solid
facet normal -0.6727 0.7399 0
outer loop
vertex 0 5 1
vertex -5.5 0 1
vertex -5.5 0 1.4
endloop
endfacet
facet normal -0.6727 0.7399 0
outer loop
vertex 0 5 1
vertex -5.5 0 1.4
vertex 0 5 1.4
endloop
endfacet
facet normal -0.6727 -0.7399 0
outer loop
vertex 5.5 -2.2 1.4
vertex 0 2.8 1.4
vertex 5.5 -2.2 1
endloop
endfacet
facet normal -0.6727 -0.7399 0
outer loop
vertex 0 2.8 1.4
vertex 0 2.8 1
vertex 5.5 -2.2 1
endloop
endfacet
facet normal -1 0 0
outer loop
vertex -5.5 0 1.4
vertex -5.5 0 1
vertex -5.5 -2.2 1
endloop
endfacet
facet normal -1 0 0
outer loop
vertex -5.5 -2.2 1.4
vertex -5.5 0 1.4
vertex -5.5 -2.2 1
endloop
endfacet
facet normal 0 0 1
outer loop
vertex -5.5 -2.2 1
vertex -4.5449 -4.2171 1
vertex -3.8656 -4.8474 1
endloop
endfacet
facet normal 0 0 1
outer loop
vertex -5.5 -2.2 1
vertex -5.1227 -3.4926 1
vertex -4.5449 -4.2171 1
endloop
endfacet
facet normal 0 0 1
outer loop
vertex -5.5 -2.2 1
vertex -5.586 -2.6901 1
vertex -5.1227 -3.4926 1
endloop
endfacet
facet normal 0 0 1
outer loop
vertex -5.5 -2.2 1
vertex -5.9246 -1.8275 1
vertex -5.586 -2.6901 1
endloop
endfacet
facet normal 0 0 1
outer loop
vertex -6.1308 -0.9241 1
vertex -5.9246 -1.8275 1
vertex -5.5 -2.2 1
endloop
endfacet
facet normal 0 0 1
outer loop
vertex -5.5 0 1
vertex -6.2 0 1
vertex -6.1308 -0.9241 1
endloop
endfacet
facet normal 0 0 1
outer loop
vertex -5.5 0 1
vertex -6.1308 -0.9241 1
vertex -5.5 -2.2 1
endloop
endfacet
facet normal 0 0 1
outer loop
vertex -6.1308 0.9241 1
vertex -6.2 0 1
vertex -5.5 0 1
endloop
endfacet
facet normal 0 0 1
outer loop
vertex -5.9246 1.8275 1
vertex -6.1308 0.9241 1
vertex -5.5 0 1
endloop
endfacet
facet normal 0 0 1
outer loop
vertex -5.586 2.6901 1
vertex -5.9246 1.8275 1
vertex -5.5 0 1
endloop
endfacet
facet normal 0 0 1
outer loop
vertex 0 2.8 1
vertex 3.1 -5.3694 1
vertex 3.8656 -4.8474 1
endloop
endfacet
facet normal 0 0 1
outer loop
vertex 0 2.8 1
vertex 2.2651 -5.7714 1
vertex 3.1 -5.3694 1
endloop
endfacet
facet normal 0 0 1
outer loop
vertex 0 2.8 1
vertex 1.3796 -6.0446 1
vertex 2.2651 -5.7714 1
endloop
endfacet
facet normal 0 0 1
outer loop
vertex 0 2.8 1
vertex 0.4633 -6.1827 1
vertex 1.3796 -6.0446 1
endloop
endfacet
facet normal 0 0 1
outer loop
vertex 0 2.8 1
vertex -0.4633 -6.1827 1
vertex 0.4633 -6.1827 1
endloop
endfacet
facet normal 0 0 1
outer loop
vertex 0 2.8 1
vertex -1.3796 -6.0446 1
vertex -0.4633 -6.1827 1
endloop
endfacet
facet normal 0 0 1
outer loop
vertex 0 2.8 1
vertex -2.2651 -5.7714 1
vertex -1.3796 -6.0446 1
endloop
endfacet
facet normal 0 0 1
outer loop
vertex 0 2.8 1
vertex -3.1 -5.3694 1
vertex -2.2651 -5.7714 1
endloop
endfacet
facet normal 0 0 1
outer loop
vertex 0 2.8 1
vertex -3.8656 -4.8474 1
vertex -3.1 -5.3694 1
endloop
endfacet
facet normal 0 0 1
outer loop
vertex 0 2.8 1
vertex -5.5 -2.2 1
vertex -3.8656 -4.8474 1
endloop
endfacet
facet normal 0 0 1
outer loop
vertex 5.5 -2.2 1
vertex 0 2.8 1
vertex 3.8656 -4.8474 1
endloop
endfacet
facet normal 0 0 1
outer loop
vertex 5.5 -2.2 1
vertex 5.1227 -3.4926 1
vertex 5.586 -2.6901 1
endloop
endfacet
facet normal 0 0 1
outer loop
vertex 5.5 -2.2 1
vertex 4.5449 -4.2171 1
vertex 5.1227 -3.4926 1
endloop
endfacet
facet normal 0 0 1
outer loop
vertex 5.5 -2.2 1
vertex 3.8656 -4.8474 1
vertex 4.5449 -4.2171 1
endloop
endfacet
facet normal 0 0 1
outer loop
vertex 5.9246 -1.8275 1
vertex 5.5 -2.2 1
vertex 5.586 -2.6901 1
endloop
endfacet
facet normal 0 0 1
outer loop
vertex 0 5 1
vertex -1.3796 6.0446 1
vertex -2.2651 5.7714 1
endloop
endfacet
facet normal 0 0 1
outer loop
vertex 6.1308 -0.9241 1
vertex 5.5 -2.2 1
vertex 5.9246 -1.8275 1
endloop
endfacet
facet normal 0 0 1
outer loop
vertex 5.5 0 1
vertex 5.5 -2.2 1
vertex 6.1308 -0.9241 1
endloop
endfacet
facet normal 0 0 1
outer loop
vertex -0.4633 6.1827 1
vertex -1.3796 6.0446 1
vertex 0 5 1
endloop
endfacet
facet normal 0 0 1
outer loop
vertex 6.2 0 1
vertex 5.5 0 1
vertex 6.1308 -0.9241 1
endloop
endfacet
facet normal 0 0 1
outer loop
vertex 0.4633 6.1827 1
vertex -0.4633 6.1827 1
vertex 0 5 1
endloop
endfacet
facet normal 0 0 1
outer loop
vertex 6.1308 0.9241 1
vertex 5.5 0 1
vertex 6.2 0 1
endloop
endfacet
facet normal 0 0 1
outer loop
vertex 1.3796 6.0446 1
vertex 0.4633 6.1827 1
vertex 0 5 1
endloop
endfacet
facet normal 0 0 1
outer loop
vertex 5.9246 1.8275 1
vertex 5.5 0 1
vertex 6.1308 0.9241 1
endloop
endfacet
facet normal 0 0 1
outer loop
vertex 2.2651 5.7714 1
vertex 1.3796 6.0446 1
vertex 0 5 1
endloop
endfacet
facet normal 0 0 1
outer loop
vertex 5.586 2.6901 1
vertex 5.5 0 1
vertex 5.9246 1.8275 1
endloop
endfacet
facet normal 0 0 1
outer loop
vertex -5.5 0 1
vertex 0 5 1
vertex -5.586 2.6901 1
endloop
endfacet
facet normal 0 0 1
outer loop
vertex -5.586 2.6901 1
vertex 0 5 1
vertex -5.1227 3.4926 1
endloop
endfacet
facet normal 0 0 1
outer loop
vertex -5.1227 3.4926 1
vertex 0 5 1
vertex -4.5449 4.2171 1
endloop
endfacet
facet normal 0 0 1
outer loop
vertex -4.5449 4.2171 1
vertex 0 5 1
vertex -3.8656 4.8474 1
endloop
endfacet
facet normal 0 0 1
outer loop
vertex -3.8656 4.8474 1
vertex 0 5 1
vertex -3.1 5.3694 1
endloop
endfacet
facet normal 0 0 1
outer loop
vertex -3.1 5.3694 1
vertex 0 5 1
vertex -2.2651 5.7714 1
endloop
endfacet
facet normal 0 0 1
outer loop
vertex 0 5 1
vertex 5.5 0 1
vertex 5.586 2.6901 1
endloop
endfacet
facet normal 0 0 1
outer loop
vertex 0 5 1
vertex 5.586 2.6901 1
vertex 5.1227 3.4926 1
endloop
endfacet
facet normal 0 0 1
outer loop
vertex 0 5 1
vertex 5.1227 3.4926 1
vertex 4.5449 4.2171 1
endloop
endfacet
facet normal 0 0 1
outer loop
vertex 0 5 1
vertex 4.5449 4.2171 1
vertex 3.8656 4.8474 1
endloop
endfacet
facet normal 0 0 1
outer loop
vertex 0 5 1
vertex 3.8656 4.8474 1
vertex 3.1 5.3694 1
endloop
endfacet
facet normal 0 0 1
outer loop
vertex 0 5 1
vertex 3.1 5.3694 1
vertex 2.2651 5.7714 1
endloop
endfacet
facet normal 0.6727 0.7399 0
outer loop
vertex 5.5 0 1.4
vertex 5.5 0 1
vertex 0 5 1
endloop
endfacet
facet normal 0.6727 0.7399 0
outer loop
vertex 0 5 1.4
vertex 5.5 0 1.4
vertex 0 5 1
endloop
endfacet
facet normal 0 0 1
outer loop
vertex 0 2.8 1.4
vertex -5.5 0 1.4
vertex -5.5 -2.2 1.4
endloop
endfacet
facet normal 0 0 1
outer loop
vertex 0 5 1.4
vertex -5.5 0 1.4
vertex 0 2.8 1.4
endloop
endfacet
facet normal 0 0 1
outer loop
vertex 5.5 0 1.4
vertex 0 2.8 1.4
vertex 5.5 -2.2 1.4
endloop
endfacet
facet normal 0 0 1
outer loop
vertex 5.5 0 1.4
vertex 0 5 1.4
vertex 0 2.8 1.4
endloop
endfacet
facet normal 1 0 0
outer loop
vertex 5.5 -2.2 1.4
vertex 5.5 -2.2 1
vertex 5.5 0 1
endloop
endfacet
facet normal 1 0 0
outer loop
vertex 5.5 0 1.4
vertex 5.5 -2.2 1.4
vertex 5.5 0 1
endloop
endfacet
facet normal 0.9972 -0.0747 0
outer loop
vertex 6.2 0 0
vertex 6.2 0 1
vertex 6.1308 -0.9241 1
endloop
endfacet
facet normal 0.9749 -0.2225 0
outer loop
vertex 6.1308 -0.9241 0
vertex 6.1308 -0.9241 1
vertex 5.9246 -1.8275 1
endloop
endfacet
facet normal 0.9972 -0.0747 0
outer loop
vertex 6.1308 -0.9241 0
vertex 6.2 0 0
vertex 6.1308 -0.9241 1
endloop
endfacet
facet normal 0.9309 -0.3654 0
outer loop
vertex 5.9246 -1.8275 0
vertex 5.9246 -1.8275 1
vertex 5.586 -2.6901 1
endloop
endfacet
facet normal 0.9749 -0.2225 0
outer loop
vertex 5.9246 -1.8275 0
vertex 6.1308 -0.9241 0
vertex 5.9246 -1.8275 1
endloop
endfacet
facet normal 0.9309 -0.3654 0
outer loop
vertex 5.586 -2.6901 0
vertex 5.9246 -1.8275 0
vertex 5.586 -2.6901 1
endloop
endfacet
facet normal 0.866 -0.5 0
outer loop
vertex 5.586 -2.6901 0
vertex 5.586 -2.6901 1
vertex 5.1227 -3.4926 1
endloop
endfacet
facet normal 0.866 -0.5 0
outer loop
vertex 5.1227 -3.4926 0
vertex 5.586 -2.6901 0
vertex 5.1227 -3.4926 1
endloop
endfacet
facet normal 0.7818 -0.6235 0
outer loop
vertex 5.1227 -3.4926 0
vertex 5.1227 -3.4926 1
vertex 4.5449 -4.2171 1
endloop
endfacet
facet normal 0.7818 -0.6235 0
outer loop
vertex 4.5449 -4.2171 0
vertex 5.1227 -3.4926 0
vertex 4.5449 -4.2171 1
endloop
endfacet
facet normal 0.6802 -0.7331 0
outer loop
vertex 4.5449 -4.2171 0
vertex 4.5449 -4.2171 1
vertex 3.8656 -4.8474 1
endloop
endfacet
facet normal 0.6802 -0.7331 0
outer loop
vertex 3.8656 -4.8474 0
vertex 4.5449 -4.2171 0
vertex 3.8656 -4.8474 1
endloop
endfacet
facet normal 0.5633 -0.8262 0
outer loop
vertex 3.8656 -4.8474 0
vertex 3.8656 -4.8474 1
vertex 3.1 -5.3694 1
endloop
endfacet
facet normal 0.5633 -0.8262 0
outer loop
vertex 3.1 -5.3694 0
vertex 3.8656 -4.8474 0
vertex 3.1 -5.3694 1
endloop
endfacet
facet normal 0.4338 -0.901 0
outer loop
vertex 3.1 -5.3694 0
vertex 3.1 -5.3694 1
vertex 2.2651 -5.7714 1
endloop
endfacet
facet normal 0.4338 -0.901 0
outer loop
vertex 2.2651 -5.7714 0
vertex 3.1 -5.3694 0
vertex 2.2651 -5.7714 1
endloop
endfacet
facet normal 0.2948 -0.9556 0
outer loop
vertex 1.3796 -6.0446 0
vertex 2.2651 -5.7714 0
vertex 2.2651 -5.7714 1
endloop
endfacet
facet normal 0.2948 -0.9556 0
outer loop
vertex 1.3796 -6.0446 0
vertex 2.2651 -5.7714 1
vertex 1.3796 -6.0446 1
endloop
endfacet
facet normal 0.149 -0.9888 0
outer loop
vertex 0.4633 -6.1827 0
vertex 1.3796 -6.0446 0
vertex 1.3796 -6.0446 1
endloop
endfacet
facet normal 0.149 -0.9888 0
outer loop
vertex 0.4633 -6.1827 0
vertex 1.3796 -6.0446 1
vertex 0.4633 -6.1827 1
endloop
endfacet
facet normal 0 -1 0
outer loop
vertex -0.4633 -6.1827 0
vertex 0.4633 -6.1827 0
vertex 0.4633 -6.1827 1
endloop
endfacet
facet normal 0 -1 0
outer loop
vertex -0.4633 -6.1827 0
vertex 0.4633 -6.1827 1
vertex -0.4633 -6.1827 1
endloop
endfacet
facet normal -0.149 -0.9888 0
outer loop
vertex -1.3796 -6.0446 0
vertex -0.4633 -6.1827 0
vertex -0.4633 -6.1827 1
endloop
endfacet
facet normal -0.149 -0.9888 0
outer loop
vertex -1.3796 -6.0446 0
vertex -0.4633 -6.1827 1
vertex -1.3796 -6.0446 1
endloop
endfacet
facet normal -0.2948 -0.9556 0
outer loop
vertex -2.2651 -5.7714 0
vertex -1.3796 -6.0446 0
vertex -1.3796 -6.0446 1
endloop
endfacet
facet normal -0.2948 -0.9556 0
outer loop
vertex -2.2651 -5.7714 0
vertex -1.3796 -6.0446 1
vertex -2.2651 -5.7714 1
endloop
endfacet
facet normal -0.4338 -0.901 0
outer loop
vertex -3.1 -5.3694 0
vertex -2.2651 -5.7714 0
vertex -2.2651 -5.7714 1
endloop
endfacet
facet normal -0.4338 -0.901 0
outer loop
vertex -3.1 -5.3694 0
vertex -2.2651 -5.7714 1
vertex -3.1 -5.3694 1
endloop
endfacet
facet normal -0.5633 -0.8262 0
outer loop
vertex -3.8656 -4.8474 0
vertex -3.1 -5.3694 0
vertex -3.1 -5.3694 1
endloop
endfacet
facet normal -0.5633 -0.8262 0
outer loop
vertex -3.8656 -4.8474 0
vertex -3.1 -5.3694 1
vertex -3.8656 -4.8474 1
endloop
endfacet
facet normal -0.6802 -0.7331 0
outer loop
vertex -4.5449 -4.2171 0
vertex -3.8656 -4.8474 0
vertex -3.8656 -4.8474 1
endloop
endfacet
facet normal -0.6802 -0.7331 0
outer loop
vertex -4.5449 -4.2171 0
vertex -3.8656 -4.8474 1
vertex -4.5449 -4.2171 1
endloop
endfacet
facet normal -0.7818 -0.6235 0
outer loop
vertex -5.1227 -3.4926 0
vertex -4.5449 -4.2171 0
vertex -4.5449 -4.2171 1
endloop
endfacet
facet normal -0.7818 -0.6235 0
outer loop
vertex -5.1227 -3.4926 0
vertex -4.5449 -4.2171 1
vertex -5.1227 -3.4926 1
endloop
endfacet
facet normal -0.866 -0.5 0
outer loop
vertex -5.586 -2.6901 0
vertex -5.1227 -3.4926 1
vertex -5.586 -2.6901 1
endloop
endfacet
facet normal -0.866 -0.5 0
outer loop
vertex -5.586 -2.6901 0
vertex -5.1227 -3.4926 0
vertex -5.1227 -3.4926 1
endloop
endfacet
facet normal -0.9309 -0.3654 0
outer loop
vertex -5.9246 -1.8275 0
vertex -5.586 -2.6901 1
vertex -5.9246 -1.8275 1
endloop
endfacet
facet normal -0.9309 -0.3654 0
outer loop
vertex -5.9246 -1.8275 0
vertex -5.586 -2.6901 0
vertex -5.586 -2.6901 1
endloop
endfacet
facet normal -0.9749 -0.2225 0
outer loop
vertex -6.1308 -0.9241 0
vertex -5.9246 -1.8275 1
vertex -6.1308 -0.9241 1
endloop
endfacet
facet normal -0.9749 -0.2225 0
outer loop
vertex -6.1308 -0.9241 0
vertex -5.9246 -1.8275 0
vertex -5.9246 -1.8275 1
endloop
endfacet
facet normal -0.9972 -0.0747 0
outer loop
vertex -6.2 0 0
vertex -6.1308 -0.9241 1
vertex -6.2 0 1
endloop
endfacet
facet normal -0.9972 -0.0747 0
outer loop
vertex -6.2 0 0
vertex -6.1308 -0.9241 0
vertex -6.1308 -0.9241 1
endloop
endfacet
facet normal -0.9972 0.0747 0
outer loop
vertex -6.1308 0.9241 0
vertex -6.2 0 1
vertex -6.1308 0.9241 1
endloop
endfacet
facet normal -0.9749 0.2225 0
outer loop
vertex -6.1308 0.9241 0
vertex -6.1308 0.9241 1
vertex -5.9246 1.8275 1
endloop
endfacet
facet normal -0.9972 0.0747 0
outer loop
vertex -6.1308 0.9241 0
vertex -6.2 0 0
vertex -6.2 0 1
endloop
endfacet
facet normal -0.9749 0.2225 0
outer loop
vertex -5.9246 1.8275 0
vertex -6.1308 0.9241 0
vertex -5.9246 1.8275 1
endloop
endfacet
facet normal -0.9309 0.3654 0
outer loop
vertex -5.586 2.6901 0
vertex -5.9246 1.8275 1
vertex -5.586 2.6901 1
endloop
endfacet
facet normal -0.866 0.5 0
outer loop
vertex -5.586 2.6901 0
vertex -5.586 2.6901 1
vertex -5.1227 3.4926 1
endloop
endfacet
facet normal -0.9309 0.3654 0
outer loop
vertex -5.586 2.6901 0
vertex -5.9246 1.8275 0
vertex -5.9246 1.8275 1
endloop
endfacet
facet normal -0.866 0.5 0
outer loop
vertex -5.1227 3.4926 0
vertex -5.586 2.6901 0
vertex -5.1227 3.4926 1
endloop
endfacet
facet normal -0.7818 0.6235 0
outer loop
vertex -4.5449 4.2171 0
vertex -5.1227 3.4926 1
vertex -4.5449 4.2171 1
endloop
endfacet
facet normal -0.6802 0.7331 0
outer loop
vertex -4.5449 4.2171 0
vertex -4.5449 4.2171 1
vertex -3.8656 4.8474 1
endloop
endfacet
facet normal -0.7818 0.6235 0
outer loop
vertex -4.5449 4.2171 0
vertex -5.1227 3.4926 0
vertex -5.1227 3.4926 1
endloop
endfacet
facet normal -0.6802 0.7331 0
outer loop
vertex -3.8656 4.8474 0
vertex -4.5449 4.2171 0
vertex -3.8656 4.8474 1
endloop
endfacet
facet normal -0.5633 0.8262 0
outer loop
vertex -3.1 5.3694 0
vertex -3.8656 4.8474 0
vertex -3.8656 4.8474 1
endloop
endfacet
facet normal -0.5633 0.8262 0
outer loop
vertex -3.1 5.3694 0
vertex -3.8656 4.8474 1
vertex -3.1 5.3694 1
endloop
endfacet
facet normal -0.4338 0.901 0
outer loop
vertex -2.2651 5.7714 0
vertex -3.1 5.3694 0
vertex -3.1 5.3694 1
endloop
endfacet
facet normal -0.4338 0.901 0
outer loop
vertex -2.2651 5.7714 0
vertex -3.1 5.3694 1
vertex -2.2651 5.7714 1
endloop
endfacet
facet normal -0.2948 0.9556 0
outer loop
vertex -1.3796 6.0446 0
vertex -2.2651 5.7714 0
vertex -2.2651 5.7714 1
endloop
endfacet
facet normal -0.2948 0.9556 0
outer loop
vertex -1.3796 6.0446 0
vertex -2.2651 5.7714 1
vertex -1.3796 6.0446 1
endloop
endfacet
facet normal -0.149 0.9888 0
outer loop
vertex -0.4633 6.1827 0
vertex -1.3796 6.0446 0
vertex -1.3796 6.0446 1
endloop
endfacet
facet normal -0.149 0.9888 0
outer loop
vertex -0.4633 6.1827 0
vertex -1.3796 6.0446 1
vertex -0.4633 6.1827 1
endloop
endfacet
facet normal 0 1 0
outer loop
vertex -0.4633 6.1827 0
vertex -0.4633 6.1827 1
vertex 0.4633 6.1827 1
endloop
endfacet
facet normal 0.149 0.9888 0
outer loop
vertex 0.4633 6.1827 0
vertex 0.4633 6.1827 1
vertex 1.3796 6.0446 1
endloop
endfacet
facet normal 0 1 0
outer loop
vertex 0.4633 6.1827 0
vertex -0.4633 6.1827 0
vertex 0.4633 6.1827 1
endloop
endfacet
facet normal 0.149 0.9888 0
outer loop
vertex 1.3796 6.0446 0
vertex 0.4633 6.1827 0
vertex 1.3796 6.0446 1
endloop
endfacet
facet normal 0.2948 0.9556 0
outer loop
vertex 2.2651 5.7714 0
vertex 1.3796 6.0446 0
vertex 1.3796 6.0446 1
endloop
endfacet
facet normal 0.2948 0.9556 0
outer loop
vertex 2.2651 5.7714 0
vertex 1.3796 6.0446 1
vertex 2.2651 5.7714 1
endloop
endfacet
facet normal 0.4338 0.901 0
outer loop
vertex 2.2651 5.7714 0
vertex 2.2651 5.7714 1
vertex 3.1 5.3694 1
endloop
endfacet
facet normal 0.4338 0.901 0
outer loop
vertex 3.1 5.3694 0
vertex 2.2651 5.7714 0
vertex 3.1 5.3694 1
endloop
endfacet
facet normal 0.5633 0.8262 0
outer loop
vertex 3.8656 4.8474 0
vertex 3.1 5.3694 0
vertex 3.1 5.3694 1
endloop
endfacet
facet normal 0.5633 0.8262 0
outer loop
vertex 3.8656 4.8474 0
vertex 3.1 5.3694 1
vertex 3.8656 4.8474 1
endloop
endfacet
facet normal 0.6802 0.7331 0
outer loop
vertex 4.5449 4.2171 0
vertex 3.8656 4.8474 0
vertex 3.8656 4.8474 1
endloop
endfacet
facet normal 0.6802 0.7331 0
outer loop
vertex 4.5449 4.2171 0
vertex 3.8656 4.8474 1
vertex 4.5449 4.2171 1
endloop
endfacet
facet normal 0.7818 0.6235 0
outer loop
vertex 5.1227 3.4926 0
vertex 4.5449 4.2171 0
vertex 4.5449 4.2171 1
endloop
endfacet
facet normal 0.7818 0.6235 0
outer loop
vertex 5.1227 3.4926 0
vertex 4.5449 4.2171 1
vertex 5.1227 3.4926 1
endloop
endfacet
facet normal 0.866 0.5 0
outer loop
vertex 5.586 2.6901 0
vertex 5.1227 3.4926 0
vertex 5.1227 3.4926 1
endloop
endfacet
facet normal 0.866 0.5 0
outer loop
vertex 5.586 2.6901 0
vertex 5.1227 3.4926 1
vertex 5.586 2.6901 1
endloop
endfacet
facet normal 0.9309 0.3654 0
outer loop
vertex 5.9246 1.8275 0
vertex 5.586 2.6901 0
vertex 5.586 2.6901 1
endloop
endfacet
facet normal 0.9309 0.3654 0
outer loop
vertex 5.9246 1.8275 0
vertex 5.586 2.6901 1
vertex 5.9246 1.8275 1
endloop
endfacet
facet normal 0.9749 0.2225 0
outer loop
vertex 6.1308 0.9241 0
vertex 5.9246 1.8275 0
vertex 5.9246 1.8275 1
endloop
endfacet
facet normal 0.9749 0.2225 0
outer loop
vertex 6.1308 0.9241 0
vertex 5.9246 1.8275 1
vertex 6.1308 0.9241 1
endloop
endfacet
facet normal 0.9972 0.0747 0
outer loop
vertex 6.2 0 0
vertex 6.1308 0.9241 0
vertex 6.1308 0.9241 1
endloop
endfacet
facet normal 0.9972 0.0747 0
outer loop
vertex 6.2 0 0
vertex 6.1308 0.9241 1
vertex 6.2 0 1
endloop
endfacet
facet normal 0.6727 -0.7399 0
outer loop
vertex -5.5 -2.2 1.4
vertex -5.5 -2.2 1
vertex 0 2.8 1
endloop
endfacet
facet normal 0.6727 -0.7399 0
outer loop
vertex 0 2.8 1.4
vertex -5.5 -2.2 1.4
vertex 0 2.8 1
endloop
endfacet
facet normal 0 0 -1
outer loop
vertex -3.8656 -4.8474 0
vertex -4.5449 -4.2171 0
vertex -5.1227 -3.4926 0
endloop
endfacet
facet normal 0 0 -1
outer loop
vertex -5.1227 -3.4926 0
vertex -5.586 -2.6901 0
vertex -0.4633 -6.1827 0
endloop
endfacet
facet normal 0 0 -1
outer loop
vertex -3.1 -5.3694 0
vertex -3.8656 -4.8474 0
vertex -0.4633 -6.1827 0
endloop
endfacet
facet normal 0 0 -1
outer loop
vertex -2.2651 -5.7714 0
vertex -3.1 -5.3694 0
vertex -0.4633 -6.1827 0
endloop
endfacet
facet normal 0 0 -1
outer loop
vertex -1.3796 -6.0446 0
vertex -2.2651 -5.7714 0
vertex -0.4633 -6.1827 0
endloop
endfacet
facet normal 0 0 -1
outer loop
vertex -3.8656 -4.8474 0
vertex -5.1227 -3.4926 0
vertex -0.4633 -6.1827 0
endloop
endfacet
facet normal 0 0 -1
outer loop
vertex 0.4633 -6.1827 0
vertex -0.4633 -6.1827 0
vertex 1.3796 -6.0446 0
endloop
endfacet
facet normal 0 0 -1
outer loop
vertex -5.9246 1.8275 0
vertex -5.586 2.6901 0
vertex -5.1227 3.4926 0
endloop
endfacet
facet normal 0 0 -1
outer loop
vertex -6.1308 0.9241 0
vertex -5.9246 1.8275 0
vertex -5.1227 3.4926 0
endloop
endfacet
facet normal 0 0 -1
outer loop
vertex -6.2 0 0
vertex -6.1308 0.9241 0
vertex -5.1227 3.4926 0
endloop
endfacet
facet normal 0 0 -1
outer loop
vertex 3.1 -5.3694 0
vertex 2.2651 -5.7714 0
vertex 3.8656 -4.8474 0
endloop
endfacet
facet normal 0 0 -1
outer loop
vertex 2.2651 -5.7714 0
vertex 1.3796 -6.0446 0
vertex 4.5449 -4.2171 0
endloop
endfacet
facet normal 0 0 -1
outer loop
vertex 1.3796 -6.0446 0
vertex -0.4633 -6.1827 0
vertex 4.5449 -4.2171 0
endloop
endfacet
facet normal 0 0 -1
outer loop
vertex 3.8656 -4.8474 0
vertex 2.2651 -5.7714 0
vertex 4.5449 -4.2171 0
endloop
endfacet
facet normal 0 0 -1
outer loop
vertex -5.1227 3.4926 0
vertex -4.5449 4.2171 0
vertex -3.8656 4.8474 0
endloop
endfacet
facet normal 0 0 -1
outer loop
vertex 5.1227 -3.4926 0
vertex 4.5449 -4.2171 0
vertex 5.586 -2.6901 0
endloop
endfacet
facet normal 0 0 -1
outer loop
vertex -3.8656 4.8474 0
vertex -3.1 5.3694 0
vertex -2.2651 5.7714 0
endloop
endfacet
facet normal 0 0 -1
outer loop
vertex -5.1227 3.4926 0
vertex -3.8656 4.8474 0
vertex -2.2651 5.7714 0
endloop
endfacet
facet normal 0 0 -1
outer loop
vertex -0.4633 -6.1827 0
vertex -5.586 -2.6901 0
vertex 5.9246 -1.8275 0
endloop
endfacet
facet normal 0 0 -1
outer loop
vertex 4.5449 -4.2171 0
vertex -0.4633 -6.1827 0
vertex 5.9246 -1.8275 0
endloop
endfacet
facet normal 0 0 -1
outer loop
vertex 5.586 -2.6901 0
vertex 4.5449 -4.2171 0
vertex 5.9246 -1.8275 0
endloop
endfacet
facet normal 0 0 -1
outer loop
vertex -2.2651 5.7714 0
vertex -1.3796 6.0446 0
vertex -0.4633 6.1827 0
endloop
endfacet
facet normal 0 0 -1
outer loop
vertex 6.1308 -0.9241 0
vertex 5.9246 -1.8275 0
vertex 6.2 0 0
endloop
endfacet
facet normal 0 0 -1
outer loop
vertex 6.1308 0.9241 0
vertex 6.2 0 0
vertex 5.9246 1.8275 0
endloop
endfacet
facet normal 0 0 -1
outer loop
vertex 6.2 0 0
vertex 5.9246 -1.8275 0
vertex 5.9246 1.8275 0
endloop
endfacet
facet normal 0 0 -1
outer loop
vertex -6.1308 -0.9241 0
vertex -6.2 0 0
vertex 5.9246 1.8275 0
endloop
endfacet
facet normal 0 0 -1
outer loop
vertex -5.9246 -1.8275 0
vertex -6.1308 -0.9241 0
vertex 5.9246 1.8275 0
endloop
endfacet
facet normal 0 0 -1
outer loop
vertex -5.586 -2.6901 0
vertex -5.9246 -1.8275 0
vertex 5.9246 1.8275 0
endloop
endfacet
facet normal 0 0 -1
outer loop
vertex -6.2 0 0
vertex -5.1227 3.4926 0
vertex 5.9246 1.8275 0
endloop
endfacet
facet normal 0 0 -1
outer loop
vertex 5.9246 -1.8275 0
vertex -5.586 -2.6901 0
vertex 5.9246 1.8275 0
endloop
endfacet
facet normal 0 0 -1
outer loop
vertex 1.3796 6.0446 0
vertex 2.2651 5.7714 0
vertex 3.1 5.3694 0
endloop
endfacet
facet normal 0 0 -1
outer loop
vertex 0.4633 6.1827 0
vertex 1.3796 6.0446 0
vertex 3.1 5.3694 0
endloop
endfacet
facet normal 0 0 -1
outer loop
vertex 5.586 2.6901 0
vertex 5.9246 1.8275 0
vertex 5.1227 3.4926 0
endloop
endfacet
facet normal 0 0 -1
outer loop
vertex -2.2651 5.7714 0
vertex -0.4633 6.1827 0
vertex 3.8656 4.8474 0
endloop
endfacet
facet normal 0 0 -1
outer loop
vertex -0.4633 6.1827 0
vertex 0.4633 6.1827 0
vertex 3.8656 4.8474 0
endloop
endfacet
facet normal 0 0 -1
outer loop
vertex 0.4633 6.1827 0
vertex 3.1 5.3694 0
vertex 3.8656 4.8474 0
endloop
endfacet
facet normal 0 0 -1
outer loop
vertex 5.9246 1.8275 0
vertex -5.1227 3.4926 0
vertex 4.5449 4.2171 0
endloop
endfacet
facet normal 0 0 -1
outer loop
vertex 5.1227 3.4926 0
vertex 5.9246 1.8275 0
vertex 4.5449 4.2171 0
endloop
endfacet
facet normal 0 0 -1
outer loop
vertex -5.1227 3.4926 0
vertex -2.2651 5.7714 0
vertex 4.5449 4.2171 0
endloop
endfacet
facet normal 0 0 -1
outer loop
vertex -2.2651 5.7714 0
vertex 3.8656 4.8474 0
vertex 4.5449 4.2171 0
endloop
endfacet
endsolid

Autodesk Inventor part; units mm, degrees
ref_plane "YZ Plane" through (0, 0, 0) normal (1, 0, 0) x (0, 1, 0)
ref_plane "XZ Plane" through (0, 0, 0) normal (0, 1, 0) x (-1, 0, 0)
ref_plane "XY Plane" through (0, 0, 0) normal (0, 0, 1) x (1, 0, 0)
sketch "Náčrt1" plane through (0, 0, 0) normal (0, 0, 1) x (1, 0, 0)
  line L0 (0, 8.68) -> (0, -8.68) projected
  line L1 (-8.68, 0) -> (8.68, 0) projected
  circle A0 centre (0, 0) radius 6.2
  dimension "d0" = 12.4
extrude "Vysunutí1" add sketch "Náčrt1" along normal blind 1
sketch "Náčrt2" plane through (0, 0, 1) normal (0, 0, 1) x (1, 0, 0)
  line L0 (-8.68, 0) -> (8.68, 0) projected
  line L1 (0, 8.68) -> (0, -8.68) projected
  line L2 (-5.5, 0) -> (-5.5, -2.2)
  line L3 (-5.5, -2.2) -> (0, 2.8)
  line L4 (-5.5, 0) -> (0, 5)
  line L5 (5.5, 0) -> (0, 5)
  line L6 (0, 2.8) -> (5.5, -2.2)
  line L7 (5.5, -2.2) -> (5.5, 0)
  point P0 (0, 0)
  dimension "d3" = 2.2
  dimension "d4" = 2.2
  dimension "d5" = 5.5
  dimension "d6" = 5.5
  dimension "d7" = 5
  dimension "d8" = 2.2
extrude "Vysunutí2" add sketch "Náčrt2" along normal blind 0.4 contours L4 L1 L3 L0 | L0 L3 L2 | L5 L0 L6 L1 | L7 L6 L0
properties part number "button_plate_arrow"
